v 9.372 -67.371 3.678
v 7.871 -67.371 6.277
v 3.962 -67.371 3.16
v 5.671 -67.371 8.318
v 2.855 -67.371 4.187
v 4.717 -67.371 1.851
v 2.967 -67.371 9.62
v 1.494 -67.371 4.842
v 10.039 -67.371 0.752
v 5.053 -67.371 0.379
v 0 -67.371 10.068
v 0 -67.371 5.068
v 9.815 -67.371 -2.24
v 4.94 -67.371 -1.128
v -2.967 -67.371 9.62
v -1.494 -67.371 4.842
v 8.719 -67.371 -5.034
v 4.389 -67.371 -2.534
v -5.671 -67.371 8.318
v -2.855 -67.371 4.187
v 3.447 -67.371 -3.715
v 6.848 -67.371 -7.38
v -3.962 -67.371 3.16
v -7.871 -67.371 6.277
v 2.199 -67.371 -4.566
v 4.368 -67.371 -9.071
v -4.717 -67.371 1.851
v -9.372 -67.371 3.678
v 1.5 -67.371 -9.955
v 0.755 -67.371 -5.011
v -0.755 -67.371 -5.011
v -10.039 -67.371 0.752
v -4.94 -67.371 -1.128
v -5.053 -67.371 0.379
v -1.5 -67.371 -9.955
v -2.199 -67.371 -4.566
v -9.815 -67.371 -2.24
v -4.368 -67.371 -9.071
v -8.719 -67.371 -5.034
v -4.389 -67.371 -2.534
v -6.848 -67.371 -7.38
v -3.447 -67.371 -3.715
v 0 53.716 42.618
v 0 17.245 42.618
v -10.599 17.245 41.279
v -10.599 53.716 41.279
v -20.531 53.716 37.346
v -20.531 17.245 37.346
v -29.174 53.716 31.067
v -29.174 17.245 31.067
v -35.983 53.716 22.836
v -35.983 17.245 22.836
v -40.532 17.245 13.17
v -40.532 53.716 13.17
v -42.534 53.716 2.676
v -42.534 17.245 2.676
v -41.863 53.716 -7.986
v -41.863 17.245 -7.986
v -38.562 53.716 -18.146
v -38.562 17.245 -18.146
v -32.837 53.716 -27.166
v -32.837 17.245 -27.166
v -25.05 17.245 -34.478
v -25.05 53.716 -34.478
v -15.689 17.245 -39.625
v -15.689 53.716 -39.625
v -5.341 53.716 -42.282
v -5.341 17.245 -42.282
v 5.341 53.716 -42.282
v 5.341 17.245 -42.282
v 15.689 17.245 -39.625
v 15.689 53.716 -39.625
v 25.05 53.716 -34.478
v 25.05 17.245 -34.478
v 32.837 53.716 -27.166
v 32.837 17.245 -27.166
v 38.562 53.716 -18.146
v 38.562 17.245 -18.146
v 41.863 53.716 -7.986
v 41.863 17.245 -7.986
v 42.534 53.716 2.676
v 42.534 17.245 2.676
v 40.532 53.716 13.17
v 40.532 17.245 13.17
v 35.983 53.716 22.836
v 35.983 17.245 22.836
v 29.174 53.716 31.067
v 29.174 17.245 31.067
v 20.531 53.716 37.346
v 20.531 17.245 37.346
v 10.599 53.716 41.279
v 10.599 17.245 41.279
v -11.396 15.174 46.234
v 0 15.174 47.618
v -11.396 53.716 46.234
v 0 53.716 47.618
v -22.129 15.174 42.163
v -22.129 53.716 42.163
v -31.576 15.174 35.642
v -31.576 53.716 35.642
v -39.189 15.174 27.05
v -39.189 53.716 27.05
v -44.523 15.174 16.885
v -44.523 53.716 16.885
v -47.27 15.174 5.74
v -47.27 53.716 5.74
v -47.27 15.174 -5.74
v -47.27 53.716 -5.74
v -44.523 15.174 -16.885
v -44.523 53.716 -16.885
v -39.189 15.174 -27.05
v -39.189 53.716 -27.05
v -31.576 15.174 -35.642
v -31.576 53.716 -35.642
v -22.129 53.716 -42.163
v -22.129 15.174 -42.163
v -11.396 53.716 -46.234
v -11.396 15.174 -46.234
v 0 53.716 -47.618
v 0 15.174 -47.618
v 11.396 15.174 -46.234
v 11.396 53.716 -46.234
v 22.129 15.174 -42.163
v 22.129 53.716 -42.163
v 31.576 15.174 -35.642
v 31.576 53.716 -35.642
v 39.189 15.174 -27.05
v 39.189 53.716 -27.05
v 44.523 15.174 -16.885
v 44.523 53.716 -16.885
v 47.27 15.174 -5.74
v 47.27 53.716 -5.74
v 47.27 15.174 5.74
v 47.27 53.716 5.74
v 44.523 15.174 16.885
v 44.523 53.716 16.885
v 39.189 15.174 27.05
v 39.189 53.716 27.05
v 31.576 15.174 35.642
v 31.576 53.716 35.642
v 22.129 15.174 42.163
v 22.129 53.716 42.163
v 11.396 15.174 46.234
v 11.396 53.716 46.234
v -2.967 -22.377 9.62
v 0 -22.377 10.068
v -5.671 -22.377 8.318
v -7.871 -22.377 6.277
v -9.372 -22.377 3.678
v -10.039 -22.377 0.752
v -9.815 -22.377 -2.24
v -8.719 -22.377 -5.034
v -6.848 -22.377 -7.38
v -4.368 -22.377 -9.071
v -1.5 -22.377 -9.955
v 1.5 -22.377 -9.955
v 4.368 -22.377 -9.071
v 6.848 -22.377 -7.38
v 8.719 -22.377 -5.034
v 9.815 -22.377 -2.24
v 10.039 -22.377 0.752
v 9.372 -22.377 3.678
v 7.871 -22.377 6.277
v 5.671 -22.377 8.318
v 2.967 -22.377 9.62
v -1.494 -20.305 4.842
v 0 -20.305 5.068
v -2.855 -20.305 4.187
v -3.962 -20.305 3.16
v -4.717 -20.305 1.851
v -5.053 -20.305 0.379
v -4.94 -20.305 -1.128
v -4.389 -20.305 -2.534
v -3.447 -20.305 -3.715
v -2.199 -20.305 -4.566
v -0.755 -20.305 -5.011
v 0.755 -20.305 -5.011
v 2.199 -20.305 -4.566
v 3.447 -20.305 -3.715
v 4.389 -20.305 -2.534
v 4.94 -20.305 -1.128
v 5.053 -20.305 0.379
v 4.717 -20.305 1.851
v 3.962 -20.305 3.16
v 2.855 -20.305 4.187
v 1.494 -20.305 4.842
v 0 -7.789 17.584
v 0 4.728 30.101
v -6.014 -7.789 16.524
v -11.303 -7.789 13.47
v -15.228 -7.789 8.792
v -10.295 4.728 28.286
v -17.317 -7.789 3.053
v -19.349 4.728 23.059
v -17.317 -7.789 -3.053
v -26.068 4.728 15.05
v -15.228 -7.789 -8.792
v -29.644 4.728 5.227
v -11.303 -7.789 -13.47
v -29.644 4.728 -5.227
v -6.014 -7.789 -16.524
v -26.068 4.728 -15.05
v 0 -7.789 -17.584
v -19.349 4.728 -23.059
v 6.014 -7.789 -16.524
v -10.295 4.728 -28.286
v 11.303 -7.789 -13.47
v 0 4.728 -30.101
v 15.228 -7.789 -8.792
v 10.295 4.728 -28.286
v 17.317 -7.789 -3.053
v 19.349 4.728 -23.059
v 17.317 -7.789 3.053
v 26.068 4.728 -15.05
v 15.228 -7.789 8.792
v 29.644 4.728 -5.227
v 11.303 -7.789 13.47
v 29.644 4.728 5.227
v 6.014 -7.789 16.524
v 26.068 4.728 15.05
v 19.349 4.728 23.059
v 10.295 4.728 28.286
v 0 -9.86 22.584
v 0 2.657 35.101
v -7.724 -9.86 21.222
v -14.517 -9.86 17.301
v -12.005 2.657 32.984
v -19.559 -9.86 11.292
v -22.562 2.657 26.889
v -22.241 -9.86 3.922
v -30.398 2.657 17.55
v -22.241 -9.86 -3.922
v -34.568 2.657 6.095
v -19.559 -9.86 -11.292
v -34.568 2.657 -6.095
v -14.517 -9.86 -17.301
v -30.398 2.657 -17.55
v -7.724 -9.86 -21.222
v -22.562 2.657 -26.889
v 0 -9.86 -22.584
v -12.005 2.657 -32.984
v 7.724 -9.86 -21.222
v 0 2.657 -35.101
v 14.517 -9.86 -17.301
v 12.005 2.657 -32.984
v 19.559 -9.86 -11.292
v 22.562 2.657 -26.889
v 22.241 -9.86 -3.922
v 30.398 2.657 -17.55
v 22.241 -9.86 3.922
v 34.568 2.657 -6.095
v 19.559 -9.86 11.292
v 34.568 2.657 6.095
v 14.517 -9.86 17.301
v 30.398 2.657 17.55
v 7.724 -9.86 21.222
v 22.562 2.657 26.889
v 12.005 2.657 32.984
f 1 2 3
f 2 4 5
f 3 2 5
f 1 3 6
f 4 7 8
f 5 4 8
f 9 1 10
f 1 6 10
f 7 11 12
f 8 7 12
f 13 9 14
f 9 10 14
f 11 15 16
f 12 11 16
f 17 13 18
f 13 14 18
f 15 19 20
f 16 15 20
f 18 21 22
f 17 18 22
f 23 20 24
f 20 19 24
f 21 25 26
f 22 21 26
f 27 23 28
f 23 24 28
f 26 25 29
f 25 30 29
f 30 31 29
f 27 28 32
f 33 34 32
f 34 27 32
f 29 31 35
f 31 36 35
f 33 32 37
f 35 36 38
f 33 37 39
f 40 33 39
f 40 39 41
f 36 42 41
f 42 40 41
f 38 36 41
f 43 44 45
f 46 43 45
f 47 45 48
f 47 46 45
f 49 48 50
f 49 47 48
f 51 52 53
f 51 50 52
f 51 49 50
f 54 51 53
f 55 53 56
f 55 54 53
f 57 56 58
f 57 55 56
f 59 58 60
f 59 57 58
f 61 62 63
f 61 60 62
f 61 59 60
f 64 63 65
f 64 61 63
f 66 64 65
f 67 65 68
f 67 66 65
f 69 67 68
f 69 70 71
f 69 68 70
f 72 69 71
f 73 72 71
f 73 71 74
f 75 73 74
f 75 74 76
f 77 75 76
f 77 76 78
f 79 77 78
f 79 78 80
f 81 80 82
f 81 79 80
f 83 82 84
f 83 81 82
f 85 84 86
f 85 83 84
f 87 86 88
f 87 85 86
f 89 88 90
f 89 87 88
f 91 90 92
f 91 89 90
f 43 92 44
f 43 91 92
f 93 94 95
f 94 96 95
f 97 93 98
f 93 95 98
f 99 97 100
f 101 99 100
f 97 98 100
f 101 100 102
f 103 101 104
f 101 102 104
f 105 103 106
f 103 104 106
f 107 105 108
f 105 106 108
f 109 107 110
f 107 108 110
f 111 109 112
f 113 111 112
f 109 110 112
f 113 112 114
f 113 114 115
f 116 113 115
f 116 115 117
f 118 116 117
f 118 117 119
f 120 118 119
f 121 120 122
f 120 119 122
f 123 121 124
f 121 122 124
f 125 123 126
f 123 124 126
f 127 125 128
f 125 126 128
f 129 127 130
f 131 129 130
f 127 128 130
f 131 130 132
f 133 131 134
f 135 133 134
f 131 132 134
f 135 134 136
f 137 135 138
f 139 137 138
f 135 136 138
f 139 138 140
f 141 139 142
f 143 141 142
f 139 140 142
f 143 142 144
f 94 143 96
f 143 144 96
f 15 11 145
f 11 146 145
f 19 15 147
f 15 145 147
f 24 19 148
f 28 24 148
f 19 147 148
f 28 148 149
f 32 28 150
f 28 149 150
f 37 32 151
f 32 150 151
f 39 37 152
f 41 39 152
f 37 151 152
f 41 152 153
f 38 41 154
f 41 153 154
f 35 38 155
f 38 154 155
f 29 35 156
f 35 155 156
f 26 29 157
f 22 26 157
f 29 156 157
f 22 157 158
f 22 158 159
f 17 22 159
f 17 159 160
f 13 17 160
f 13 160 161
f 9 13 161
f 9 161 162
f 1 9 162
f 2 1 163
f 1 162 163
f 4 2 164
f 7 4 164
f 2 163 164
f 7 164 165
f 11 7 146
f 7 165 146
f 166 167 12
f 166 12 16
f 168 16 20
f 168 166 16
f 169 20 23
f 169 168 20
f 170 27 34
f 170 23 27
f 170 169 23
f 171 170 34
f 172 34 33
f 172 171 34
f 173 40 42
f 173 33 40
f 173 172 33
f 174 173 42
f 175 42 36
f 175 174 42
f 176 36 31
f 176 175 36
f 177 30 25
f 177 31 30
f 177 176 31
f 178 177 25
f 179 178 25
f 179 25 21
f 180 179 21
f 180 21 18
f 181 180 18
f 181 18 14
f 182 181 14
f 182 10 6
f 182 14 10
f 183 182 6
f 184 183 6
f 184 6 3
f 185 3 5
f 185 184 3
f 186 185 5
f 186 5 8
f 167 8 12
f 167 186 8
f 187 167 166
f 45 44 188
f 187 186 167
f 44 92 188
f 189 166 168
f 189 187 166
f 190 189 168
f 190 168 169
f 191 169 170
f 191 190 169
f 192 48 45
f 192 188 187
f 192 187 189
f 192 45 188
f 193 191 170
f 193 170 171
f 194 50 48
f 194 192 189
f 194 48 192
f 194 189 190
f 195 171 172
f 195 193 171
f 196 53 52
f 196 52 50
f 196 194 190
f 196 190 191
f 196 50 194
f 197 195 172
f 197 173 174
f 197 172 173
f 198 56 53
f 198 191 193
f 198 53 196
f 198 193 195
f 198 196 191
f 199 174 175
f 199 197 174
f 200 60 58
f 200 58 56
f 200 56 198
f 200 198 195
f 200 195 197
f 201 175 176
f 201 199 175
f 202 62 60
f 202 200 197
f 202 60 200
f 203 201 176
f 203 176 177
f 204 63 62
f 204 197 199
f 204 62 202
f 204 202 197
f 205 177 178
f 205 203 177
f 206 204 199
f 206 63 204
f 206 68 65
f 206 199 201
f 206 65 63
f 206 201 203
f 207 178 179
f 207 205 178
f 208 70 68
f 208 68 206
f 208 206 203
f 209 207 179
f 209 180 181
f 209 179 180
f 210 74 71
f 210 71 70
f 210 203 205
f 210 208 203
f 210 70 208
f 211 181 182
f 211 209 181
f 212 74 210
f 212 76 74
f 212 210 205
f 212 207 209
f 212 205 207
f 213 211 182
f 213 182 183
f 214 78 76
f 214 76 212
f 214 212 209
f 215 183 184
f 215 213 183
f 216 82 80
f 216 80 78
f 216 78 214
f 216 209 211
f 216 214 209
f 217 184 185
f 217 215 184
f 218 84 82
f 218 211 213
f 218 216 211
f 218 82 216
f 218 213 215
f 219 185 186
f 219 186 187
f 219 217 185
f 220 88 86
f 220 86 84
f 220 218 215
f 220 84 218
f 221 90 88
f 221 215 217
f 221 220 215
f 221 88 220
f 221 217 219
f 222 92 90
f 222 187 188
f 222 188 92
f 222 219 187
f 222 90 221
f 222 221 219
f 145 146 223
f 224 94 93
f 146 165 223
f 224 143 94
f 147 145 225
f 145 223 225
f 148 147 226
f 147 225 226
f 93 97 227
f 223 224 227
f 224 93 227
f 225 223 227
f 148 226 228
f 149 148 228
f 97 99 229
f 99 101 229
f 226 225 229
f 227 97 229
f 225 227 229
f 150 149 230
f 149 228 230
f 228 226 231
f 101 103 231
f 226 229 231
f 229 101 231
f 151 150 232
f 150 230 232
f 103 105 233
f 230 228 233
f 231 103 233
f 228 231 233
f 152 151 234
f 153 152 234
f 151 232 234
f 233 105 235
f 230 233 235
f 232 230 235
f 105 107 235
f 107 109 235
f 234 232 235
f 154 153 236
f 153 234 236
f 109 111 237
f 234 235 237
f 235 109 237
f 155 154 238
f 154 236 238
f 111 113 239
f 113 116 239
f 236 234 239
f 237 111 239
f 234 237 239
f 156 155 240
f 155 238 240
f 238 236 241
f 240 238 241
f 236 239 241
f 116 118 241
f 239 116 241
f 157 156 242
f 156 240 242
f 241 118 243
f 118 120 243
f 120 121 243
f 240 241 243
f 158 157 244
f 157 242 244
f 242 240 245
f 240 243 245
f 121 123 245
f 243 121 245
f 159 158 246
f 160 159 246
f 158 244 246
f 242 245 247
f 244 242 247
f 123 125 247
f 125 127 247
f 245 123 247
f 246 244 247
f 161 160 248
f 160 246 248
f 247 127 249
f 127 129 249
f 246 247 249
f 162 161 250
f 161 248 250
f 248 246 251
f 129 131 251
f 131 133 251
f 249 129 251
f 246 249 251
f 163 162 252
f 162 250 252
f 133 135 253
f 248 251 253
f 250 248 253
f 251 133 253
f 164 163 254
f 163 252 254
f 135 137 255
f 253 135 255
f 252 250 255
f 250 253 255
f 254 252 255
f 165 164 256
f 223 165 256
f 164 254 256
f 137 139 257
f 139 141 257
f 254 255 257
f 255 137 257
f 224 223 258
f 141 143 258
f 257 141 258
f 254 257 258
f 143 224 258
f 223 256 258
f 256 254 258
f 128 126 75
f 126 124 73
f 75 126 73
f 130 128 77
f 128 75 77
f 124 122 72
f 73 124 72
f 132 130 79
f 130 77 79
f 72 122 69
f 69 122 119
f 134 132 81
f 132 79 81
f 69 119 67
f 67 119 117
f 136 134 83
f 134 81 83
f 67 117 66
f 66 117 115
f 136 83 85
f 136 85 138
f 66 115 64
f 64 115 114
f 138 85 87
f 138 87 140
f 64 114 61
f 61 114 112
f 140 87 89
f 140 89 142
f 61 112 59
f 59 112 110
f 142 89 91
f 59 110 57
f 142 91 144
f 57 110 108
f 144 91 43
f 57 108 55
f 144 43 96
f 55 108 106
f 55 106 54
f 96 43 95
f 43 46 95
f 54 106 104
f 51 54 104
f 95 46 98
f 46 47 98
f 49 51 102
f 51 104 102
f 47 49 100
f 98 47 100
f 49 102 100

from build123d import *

# Parameters (mm, degrees)
VACIADO1_T = -5


with BuildPart() as part:
    # Croquis1 → Revolución1 (revolve)
    with BuildSketch(Plane(origin=(0, 0, 0), x_dir=(0, 0, -1), z_dir=(1, 0, 0)), mode=Mode.PRIVATE) as revoluci_n1_sk:
        Polygon((0, 53.716293677), (0, -67.370540613), (10.067532341, -67.370540613), (10.067532341, -22.376525686), (47.617684505, 15.173626478), (47.617684505, 53.716293677), align=None)
    revolve(revoluci_n1_sk.sketch.rotate(Axis((0, 53.716293677, 0), (0, -1, 0)), 180), axis=Axis((0, 53.716293677, 0), (0, -1, 0)))

    # Vaciado1
    vaciado1_openings = [part.faces().sort_by_distance(p)[0] for p in [
        (0, -67.370540613, 0),
        (0, 53.716293677, 0),
    ]]
    offset(amount=VACIADO1_T, openings=vaciado1_openings, kind=Kind.INTERSECTION)


solid = part.part
